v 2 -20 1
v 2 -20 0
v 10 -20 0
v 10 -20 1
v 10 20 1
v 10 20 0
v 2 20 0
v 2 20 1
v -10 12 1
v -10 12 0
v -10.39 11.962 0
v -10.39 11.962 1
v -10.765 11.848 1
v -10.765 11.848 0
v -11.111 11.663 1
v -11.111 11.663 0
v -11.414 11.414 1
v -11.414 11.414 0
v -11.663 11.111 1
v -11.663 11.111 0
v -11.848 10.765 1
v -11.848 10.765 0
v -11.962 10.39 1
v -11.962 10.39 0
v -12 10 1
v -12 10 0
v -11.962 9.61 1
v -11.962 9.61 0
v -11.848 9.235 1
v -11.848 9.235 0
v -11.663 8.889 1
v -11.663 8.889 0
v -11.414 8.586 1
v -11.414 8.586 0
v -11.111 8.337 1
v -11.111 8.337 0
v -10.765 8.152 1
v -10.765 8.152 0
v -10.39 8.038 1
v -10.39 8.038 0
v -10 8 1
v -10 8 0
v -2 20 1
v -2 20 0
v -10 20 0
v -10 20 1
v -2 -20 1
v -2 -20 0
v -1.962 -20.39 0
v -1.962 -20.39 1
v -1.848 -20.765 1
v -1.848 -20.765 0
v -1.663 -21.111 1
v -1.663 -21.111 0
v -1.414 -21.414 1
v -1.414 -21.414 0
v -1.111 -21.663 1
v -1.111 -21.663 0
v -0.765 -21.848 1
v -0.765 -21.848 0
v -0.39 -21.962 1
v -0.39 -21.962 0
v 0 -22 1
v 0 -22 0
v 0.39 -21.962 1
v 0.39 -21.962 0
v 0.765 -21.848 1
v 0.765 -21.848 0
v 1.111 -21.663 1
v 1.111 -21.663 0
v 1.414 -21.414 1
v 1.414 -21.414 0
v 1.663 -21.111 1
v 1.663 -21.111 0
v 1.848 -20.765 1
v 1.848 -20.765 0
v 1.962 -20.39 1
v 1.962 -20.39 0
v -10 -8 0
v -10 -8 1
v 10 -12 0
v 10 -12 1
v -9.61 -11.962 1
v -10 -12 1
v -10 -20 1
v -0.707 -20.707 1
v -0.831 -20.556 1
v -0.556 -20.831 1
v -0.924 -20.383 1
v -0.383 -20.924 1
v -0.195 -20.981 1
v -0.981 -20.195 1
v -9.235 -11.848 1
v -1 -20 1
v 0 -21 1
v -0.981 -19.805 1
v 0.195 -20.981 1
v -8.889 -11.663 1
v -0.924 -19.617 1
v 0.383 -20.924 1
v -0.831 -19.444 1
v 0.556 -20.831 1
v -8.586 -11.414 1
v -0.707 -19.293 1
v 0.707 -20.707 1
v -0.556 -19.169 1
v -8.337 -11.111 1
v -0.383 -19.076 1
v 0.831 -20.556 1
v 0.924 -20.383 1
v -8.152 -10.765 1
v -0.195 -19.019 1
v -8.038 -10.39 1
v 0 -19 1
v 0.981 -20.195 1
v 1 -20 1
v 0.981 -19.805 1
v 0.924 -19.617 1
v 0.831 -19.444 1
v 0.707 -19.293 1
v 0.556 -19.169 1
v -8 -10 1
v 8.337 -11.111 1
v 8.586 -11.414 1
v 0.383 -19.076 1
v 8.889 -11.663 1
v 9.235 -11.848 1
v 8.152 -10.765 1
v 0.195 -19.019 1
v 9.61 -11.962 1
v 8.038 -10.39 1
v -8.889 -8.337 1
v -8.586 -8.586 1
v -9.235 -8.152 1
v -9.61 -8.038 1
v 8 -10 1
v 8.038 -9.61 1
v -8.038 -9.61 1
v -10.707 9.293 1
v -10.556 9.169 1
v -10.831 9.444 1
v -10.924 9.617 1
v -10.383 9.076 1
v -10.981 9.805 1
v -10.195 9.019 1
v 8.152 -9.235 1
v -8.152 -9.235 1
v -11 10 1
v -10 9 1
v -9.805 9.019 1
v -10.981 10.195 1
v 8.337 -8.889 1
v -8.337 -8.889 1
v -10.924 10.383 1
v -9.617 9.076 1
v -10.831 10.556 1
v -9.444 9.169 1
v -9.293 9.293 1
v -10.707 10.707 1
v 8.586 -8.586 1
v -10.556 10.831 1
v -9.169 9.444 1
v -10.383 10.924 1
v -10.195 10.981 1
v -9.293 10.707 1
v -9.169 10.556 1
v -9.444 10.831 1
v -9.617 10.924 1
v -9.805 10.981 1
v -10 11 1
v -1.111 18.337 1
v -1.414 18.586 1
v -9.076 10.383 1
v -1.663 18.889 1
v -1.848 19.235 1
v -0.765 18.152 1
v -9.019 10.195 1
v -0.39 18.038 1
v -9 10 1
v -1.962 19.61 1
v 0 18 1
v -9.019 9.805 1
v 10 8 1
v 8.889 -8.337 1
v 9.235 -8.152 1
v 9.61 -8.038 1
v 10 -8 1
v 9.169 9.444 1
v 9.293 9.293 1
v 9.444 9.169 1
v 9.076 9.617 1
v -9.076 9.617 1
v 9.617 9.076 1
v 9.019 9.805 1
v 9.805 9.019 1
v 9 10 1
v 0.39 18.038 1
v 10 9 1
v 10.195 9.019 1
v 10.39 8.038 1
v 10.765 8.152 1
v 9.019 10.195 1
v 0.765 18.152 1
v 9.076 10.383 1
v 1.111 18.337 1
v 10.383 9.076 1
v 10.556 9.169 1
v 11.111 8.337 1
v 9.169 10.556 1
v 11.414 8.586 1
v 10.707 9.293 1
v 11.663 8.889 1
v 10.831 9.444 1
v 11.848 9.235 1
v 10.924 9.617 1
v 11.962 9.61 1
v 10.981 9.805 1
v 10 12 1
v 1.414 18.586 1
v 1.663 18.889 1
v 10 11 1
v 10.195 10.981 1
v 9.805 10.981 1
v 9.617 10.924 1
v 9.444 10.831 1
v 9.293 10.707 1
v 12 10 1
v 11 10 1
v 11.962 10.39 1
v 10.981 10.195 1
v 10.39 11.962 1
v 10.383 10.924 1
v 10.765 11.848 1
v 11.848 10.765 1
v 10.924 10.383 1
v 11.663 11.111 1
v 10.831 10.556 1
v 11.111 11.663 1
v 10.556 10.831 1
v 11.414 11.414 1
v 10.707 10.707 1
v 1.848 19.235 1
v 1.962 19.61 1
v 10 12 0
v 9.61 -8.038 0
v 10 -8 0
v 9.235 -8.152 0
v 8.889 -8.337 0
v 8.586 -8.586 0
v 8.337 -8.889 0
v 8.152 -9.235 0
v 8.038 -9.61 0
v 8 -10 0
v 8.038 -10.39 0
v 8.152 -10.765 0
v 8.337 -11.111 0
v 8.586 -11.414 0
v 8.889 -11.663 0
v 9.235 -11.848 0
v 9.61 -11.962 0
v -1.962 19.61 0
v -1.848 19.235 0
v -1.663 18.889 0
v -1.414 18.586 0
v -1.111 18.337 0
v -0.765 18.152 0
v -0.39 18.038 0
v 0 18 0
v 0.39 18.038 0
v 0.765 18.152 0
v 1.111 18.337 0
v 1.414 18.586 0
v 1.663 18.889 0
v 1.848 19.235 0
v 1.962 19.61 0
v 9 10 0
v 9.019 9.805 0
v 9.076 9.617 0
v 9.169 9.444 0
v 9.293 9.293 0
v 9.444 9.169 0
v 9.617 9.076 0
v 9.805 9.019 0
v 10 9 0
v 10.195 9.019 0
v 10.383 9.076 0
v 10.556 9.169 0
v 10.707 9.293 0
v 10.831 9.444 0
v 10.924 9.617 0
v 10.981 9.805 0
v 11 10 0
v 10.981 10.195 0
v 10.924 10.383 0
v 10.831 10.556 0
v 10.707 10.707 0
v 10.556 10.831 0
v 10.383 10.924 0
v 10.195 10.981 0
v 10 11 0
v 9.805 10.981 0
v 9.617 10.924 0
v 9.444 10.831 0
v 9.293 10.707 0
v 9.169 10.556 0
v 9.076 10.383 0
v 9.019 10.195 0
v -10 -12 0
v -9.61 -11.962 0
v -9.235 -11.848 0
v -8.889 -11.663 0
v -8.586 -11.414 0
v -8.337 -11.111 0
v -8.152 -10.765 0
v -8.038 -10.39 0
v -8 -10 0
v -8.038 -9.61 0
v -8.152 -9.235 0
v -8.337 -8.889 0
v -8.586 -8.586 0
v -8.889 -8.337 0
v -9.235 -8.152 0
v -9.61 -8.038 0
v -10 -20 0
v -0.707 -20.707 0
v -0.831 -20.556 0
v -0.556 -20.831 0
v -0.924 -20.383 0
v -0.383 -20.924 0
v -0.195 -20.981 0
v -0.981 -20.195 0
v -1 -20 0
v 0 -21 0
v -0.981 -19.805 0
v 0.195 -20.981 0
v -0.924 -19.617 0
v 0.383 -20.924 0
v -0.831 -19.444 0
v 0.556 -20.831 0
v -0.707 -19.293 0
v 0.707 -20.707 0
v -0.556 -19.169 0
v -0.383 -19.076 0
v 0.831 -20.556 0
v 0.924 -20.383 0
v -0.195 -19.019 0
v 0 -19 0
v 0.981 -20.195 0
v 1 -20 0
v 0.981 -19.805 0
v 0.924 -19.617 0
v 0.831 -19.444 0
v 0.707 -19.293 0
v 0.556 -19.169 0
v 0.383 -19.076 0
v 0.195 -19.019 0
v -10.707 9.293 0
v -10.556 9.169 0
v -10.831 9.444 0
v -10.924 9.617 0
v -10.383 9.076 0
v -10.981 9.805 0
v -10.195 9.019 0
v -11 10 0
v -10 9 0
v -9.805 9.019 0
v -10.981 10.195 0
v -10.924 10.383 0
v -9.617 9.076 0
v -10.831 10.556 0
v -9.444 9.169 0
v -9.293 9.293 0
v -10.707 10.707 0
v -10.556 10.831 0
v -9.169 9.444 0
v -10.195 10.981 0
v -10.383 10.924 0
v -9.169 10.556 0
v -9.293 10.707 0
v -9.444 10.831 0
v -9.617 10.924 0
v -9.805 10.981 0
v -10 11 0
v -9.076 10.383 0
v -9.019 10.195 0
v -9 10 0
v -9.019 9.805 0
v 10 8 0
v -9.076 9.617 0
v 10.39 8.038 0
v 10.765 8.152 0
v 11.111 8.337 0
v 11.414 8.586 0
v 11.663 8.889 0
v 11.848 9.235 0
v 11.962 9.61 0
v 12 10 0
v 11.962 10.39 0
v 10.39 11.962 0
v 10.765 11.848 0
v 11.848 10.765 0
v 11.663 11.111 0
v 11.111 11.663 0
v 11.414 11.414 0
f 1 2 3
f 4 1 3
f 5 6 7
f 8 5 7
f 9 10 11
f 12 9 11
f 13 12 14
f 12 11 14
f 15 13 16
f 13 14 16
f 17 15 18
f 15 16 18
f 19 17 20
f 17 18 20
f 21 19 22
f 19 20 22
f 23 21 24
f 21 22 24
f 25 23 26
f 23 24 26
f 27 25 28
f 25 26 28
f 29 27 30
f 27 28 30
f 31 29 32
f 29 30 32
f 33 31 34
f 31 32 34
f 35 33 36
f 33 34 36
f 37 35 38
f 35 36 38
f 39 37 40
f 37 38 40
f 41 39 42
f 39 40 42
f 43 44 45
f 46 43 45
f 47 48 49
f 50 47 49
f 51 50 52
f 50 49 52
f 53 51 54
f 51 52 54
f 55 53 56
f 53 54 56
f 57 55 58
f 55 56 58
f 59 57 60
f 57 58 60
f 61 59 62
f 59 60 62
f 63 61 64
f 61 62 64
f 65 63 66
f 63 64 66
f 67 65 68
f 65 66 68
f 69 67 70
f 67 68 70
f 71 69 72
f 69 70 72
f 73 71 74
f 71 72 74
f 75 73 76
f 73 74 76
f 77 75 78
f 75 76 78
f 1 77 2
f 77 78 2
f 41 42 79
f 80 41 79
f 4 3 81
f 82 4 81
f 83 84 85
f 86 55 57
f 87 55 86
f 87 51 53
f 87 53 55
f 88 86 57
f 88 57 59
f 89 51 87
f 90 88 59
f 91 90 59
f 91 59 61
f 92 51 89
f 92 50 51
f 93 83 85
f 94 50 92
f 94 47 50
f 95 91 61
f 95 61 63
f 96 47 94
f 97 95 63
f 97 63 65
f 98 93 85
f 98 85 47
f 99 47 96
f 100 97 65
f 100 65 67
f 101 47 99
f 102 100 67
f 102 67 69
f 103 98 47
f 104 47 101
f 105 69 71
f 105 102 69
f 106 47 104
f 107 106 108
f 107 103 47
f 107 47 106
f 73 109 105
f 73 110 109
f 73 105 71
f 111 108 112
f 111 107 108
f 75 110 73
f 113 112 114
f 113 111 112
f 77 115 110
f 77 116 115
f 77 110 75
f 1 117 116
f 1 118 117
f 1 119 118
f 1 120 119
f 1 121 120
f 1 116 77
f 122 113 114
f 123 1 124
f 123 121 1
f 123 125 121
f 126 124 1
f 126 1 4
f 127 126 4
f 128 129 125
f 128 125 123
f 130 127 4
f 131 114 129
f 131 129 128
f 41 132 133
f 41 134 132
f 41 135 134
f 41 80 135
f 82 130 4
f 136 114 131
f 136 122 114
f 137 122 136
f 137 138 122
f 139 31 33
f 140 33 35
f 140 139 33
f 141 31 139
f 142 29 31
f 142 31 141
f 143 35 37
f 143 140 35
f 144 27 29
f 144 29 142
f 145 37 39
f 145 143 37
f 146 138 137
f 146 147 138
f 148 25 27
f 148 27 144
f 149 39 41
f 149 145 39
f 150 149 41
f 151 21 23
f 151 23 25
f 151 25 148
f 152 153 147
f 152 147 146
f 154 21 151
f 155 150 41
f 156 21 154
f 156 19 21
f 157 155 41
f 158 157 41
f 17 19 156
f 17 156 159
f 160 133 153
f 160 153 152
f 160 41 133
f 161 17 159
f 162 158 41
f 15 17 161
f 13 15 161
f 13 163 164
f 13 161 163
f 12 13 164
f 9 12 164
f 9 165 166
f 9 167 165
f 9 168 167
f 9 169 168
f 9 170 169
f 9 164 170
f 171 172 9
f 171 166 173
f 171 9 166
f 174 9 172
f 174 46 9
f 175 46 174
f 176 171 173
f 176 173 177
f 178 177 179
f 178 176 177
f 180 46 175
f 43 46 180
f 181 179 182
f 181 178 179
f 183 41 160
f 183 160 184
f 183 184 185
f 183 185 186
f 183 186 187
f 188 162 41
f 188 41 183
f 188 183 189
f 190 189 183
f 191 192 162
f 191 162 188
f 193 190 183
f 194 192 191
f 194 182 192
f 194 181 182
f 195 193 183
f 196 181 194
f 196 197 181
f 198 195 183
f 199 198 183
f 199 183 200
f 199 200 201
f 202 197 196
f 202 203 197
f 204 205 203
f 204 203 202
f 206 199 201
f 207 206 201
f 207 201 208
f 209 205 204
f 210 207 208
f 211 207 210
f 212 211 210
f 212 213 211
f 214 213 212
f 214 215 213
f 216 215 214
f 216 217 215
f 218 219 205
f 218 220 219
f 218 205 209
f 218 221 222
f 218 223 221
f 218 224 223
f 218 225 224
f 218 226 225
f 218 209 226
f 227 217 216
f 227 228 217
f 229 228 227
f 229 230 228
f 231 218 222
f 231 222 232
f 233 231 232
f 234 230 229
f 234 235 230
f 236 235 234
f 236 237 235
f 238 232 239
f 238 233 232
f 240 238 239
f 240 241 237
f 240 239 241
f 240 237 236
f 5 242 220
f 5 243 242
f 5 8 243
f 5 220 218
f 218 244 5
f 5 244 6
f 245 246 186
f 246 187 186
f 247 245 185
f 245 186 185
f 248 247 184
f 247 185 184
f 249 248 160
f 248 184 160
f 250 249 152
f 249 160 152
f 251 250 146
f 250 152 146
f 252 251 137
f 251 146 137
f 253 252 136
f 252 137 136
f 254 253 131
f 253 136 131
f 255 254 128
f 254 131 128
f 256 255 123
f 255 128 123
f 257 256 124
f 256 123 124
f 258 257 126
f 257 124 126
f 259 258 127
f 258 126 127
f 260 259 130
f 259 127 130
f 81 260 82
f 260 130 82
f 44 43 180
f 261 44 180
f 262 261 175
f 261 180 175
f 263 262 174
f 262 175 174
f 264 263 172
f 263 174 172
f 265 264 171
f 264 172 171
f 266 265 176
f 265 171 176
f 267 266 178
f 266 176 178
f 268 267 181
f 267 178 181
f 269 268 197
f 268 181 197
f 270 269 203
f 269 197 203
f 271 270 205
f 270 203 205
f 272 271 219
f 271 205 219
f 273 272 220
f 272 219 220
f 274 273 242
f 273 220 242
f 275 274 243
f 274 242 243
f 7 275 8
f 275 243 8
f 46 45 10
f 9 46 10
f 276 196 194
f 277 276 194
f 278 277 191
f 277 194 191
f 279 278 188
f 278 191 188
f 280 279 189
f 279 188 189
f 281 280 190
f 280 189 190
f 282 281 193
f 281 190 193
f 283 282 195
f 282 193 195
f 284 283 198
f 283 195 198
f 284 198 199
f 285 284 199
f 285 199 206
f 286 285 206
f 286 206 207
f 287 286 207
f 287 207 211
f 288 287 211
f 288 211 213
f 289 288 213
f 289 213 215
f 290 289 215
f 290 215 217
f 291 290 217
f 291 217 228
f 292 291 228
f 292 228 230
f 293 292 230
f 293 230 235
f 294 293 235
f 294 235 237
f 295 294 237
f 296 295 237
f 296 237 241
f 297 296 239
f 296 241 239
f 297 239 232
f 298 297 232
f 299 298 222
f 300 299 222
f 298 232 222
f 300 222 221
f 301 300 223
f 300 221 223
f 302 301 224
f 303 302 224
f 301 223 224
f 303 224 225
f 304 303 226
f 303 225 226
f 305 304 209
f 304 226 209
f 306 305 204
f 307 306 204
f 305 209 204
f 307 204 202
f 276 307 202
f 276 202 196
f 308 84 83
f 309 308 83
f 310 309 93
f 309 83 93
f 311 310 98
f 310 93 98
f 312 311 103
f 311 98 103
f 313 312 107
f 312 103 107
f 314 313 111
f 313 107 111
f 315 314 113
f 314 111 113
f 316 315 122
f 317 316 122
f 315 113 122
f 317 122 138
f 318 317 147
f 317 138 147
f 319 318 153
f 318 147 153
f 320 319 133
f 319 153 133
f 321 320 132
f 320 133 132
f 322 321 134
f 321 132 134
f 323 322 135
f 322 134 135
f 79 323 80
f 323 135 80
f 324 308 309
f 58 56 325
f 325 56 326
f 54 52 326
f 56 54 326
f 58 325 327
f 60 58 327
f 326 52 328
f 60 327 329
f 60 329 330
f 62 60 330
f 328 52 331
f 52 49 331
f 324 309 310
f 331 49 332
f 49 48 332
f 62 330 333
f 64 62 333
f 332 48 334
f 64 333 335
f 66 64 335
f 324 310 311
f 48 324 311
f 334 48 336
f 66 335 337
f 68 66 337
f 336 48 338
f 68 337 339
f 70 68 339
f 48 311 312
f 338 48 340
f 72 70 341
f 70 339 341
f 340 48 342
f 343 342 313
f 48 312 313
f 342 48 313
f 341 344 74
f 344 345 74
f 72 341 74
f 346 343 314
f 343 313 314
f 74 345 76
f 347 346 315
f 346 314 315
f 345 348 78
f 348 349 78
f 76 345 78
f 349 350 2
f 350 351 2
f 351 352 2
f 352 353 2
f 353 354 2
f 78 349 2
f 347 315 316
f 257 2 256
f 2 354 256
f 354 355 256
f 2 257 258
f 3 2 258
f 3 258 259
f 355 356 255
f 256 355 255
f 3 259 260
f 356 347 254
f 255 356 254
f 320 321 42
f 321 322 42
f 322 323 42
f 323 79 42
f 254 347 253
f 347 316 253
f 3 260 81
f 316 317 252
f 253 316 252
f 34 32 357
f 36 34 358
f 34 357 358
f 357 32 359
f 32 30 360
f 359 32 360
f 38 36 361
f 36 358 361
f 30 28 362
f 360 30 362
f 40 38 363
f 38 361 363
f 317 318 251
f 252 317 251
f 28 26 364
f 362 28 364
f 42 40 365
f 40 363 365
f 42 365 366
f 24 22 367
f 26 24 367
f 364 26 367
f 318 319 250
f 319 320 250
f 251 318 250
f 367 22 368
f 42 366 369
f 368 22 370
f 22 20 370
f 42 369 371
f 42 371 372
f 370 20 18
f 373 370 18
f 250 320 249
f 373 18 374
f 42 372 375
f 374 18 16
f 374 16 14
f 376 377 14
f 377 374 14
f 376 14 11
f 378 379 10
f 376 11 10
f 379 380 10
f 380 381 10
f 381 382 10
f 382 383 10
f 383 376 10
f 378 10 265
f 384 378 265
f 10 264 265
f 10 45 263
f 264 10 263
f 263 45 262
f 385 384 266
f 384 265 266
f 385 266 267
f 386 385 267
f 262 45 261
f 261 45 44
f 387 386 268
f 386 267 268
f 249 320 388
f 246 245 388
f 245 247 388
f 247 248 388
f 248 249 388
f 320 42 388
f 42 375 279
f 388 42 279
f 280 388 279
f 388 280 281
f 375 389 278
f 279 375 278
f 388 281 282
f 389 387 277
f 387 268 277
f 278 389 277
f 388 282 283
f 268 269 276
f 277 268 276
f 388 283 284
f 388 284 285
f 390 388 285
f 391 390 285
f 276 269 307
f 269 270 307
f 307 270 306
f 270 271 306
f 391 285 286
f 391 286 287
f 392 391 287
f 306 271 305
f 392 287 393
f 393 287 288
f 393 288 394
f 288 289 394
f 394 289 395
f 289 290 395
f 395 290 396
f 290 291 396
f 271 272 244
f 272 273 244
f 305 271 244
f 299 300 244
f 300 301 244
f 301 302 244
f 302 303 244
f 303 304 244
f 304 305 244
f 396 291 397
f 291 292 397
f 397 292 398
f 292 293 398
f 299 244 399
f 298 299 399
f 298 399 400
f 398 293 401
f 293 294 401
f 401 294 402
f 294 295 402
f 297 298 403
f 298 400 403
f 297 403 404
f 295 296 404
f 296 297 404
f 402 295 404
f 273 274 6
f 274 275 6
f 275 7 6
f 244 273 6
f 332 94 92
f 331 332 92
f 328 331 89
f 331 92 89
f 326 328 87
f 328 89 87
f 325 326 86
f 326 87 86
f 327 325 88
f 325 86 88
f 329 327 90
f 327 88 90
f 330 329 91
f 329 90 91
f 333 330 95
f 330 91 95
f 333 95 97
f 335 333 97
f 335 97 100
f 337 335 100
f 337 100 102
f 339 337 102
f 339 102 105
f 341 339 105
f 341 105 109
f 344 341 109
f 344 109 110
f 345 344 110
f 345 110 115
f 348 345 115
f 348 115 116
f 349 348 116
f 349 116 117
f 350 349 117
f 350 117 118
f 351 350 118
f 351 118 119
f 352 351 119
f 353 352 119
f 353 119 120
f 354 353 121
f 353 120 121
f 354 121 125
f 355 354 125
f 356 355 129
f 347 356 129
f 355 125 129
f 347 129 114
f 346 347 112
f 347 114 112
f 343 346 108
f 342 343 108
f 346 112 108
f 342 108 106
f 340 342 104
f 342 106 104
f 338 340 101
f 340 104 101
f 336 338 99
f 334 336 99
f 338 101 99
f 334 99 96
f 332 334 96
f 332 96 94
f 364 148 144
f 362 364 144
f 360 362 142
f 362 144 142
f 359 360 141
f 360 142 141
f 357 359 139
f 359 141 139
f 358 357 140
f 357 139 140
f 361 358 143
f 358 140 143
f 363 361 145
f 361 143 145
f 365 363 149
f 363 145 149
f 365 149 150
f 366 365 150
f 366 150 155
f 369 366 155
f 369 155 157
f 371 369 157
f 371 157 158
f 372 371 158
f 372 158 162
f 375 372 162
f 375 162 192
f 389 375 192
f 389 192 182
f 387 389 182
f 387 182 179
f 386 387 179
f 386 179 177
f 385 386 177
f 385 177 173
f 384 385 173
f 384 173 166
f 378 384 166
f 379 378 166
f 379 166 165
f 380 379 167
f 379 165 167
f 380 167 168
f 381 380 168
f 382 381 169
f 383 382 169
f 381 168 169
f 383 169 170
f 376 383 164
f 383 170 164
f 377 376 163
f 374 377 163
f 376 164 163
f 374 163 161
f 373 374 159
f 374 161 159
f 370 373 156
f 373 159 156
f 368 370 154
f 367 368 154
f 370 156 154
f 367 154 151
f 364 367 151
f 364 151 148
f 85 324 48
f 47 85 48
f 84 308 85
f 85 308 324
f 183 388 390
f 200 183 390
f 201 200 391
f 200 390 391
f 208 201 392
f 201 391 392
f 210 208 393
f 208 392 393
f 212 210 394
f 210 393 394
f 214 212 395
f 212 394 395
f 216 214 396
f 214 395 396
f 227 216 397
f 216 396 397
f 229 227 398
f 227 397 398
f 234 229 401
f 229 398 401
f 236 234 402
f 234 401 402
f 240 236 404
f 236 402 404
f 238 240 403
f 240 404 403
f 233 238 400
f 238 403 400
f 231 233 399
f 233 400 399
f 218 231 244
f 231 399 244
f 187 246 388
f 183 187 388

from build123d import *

# Parameters (mm, degrees)
F1_DEPTH = 1
F2_D     = 4
F3_D     = 2


with BuildPart() as f1:
    # F0 (on Top) → F1 (new body)
    with BuildSketch(Plane.XY):
        with BuildLine():
            Line((10, 12), (10, 20))
            Line((10, 20), (2, 20))
            ThreePointArc((2, 20), (0, 18), (-2, 20))
            Line((-2, 20), (-10, 20))
            Line((-10, 20), (-10, 12))
            Line((-10, 12), (-10, 8))
            Line((-10, 8), (-10, -8))
            ThreePointArc((-10, -8), (-8.5857864376, -8.5857864376), (-8, -10))
            ThreePointArc((-8, -10), (-8.5857864376, -11.4142135624), (-10, -12))
            Line((-10, -12), (-10, -20))
            Line((-10, -20), (-2, -20))
            Line((-2, -20), (2, -20))
            Line((2, -20), (10, -20))
            Line((10, -20), (10, -12))
            ThreePointArc((10, -12), (8, -10), (10, -8))
            Line((10, -8), (10, 8))
            Line((10, 8), (10, 12))
        make_face()
        with BuildLine():
            ThreePointArc((-2, 20), (0, 18), (2, 20))
            Line((2, 20), (-2, 20))
        make_face()
        with BuildLine():
            Line((-2, 20), (2, 20))
            ThreePointArc((2, 20), (0, 22), (-2, 20))
        make_face()
        with BuildLine():
            ThreePointArc((10, 8), (12, 10), (10, 12))
            Line((10, 12), (10, 8))
        make_face()
        with BuildLine():
            ThreePointArc((12, -10), (11.4142135624, -8.5857864376), (10, -8))
            Line((10, -8), (10, -12))
            ThreePointArc((10, -12), (11.4142135624, -11.4142135624), (12, -10))
        make_face()
        with BuildLine():
            Line((10, -12), (10, -8))
            ThreePointArc((10, -8), (8, -10), (10, -12))
        make_face()
        with BuildLine():
            Line((-10, 8), (-10, 12))
            ThreePointArc((-10, 12), (-12, 10), (-10, 8))
        make_face()
        with BuildLine():
            ThreePointArc((-8, -10), (-8.5857864376, -8.5857864376), (-10, -8))
            Line((-10, -8), (-10, -12))
            ThreePointArc((-10, -12), (-8.5857864376, -11.4142135624), (-8, -10))
        make_face()
        with BuildLine():
            Line((-10, -12), (-10, -8))
            ThreePointArc((-10, -8), (-12, -10), (-10, -12))
        make_face()
        with BuildLine():
            ThreePointArc((-2, -20), (0, -22), (2, -20))
            Line((2, -20), (-2, -20))
        make_face()
    extrude(amount=F1_DEPTH)

    # F2 (through all)
    with Locations(Plane(origin=(0, 0, 0), x_dir=(1, 0, 0), z_dir=(0, 0, -1))):
        with Locations((0, -20), (-10, 10), (10, 10)):
            Hole(F2_D / 2)

    # F3 (through all)
    with Locations(Plane(origin=(0, 0, 0), x_dir=(1, 0, 0), z_dir=(0, 0, -1))):
        with Locations((-10, -10), (10, -10), (0, 20)):
            Hole(F3_D / 2)


solid = f1.part
